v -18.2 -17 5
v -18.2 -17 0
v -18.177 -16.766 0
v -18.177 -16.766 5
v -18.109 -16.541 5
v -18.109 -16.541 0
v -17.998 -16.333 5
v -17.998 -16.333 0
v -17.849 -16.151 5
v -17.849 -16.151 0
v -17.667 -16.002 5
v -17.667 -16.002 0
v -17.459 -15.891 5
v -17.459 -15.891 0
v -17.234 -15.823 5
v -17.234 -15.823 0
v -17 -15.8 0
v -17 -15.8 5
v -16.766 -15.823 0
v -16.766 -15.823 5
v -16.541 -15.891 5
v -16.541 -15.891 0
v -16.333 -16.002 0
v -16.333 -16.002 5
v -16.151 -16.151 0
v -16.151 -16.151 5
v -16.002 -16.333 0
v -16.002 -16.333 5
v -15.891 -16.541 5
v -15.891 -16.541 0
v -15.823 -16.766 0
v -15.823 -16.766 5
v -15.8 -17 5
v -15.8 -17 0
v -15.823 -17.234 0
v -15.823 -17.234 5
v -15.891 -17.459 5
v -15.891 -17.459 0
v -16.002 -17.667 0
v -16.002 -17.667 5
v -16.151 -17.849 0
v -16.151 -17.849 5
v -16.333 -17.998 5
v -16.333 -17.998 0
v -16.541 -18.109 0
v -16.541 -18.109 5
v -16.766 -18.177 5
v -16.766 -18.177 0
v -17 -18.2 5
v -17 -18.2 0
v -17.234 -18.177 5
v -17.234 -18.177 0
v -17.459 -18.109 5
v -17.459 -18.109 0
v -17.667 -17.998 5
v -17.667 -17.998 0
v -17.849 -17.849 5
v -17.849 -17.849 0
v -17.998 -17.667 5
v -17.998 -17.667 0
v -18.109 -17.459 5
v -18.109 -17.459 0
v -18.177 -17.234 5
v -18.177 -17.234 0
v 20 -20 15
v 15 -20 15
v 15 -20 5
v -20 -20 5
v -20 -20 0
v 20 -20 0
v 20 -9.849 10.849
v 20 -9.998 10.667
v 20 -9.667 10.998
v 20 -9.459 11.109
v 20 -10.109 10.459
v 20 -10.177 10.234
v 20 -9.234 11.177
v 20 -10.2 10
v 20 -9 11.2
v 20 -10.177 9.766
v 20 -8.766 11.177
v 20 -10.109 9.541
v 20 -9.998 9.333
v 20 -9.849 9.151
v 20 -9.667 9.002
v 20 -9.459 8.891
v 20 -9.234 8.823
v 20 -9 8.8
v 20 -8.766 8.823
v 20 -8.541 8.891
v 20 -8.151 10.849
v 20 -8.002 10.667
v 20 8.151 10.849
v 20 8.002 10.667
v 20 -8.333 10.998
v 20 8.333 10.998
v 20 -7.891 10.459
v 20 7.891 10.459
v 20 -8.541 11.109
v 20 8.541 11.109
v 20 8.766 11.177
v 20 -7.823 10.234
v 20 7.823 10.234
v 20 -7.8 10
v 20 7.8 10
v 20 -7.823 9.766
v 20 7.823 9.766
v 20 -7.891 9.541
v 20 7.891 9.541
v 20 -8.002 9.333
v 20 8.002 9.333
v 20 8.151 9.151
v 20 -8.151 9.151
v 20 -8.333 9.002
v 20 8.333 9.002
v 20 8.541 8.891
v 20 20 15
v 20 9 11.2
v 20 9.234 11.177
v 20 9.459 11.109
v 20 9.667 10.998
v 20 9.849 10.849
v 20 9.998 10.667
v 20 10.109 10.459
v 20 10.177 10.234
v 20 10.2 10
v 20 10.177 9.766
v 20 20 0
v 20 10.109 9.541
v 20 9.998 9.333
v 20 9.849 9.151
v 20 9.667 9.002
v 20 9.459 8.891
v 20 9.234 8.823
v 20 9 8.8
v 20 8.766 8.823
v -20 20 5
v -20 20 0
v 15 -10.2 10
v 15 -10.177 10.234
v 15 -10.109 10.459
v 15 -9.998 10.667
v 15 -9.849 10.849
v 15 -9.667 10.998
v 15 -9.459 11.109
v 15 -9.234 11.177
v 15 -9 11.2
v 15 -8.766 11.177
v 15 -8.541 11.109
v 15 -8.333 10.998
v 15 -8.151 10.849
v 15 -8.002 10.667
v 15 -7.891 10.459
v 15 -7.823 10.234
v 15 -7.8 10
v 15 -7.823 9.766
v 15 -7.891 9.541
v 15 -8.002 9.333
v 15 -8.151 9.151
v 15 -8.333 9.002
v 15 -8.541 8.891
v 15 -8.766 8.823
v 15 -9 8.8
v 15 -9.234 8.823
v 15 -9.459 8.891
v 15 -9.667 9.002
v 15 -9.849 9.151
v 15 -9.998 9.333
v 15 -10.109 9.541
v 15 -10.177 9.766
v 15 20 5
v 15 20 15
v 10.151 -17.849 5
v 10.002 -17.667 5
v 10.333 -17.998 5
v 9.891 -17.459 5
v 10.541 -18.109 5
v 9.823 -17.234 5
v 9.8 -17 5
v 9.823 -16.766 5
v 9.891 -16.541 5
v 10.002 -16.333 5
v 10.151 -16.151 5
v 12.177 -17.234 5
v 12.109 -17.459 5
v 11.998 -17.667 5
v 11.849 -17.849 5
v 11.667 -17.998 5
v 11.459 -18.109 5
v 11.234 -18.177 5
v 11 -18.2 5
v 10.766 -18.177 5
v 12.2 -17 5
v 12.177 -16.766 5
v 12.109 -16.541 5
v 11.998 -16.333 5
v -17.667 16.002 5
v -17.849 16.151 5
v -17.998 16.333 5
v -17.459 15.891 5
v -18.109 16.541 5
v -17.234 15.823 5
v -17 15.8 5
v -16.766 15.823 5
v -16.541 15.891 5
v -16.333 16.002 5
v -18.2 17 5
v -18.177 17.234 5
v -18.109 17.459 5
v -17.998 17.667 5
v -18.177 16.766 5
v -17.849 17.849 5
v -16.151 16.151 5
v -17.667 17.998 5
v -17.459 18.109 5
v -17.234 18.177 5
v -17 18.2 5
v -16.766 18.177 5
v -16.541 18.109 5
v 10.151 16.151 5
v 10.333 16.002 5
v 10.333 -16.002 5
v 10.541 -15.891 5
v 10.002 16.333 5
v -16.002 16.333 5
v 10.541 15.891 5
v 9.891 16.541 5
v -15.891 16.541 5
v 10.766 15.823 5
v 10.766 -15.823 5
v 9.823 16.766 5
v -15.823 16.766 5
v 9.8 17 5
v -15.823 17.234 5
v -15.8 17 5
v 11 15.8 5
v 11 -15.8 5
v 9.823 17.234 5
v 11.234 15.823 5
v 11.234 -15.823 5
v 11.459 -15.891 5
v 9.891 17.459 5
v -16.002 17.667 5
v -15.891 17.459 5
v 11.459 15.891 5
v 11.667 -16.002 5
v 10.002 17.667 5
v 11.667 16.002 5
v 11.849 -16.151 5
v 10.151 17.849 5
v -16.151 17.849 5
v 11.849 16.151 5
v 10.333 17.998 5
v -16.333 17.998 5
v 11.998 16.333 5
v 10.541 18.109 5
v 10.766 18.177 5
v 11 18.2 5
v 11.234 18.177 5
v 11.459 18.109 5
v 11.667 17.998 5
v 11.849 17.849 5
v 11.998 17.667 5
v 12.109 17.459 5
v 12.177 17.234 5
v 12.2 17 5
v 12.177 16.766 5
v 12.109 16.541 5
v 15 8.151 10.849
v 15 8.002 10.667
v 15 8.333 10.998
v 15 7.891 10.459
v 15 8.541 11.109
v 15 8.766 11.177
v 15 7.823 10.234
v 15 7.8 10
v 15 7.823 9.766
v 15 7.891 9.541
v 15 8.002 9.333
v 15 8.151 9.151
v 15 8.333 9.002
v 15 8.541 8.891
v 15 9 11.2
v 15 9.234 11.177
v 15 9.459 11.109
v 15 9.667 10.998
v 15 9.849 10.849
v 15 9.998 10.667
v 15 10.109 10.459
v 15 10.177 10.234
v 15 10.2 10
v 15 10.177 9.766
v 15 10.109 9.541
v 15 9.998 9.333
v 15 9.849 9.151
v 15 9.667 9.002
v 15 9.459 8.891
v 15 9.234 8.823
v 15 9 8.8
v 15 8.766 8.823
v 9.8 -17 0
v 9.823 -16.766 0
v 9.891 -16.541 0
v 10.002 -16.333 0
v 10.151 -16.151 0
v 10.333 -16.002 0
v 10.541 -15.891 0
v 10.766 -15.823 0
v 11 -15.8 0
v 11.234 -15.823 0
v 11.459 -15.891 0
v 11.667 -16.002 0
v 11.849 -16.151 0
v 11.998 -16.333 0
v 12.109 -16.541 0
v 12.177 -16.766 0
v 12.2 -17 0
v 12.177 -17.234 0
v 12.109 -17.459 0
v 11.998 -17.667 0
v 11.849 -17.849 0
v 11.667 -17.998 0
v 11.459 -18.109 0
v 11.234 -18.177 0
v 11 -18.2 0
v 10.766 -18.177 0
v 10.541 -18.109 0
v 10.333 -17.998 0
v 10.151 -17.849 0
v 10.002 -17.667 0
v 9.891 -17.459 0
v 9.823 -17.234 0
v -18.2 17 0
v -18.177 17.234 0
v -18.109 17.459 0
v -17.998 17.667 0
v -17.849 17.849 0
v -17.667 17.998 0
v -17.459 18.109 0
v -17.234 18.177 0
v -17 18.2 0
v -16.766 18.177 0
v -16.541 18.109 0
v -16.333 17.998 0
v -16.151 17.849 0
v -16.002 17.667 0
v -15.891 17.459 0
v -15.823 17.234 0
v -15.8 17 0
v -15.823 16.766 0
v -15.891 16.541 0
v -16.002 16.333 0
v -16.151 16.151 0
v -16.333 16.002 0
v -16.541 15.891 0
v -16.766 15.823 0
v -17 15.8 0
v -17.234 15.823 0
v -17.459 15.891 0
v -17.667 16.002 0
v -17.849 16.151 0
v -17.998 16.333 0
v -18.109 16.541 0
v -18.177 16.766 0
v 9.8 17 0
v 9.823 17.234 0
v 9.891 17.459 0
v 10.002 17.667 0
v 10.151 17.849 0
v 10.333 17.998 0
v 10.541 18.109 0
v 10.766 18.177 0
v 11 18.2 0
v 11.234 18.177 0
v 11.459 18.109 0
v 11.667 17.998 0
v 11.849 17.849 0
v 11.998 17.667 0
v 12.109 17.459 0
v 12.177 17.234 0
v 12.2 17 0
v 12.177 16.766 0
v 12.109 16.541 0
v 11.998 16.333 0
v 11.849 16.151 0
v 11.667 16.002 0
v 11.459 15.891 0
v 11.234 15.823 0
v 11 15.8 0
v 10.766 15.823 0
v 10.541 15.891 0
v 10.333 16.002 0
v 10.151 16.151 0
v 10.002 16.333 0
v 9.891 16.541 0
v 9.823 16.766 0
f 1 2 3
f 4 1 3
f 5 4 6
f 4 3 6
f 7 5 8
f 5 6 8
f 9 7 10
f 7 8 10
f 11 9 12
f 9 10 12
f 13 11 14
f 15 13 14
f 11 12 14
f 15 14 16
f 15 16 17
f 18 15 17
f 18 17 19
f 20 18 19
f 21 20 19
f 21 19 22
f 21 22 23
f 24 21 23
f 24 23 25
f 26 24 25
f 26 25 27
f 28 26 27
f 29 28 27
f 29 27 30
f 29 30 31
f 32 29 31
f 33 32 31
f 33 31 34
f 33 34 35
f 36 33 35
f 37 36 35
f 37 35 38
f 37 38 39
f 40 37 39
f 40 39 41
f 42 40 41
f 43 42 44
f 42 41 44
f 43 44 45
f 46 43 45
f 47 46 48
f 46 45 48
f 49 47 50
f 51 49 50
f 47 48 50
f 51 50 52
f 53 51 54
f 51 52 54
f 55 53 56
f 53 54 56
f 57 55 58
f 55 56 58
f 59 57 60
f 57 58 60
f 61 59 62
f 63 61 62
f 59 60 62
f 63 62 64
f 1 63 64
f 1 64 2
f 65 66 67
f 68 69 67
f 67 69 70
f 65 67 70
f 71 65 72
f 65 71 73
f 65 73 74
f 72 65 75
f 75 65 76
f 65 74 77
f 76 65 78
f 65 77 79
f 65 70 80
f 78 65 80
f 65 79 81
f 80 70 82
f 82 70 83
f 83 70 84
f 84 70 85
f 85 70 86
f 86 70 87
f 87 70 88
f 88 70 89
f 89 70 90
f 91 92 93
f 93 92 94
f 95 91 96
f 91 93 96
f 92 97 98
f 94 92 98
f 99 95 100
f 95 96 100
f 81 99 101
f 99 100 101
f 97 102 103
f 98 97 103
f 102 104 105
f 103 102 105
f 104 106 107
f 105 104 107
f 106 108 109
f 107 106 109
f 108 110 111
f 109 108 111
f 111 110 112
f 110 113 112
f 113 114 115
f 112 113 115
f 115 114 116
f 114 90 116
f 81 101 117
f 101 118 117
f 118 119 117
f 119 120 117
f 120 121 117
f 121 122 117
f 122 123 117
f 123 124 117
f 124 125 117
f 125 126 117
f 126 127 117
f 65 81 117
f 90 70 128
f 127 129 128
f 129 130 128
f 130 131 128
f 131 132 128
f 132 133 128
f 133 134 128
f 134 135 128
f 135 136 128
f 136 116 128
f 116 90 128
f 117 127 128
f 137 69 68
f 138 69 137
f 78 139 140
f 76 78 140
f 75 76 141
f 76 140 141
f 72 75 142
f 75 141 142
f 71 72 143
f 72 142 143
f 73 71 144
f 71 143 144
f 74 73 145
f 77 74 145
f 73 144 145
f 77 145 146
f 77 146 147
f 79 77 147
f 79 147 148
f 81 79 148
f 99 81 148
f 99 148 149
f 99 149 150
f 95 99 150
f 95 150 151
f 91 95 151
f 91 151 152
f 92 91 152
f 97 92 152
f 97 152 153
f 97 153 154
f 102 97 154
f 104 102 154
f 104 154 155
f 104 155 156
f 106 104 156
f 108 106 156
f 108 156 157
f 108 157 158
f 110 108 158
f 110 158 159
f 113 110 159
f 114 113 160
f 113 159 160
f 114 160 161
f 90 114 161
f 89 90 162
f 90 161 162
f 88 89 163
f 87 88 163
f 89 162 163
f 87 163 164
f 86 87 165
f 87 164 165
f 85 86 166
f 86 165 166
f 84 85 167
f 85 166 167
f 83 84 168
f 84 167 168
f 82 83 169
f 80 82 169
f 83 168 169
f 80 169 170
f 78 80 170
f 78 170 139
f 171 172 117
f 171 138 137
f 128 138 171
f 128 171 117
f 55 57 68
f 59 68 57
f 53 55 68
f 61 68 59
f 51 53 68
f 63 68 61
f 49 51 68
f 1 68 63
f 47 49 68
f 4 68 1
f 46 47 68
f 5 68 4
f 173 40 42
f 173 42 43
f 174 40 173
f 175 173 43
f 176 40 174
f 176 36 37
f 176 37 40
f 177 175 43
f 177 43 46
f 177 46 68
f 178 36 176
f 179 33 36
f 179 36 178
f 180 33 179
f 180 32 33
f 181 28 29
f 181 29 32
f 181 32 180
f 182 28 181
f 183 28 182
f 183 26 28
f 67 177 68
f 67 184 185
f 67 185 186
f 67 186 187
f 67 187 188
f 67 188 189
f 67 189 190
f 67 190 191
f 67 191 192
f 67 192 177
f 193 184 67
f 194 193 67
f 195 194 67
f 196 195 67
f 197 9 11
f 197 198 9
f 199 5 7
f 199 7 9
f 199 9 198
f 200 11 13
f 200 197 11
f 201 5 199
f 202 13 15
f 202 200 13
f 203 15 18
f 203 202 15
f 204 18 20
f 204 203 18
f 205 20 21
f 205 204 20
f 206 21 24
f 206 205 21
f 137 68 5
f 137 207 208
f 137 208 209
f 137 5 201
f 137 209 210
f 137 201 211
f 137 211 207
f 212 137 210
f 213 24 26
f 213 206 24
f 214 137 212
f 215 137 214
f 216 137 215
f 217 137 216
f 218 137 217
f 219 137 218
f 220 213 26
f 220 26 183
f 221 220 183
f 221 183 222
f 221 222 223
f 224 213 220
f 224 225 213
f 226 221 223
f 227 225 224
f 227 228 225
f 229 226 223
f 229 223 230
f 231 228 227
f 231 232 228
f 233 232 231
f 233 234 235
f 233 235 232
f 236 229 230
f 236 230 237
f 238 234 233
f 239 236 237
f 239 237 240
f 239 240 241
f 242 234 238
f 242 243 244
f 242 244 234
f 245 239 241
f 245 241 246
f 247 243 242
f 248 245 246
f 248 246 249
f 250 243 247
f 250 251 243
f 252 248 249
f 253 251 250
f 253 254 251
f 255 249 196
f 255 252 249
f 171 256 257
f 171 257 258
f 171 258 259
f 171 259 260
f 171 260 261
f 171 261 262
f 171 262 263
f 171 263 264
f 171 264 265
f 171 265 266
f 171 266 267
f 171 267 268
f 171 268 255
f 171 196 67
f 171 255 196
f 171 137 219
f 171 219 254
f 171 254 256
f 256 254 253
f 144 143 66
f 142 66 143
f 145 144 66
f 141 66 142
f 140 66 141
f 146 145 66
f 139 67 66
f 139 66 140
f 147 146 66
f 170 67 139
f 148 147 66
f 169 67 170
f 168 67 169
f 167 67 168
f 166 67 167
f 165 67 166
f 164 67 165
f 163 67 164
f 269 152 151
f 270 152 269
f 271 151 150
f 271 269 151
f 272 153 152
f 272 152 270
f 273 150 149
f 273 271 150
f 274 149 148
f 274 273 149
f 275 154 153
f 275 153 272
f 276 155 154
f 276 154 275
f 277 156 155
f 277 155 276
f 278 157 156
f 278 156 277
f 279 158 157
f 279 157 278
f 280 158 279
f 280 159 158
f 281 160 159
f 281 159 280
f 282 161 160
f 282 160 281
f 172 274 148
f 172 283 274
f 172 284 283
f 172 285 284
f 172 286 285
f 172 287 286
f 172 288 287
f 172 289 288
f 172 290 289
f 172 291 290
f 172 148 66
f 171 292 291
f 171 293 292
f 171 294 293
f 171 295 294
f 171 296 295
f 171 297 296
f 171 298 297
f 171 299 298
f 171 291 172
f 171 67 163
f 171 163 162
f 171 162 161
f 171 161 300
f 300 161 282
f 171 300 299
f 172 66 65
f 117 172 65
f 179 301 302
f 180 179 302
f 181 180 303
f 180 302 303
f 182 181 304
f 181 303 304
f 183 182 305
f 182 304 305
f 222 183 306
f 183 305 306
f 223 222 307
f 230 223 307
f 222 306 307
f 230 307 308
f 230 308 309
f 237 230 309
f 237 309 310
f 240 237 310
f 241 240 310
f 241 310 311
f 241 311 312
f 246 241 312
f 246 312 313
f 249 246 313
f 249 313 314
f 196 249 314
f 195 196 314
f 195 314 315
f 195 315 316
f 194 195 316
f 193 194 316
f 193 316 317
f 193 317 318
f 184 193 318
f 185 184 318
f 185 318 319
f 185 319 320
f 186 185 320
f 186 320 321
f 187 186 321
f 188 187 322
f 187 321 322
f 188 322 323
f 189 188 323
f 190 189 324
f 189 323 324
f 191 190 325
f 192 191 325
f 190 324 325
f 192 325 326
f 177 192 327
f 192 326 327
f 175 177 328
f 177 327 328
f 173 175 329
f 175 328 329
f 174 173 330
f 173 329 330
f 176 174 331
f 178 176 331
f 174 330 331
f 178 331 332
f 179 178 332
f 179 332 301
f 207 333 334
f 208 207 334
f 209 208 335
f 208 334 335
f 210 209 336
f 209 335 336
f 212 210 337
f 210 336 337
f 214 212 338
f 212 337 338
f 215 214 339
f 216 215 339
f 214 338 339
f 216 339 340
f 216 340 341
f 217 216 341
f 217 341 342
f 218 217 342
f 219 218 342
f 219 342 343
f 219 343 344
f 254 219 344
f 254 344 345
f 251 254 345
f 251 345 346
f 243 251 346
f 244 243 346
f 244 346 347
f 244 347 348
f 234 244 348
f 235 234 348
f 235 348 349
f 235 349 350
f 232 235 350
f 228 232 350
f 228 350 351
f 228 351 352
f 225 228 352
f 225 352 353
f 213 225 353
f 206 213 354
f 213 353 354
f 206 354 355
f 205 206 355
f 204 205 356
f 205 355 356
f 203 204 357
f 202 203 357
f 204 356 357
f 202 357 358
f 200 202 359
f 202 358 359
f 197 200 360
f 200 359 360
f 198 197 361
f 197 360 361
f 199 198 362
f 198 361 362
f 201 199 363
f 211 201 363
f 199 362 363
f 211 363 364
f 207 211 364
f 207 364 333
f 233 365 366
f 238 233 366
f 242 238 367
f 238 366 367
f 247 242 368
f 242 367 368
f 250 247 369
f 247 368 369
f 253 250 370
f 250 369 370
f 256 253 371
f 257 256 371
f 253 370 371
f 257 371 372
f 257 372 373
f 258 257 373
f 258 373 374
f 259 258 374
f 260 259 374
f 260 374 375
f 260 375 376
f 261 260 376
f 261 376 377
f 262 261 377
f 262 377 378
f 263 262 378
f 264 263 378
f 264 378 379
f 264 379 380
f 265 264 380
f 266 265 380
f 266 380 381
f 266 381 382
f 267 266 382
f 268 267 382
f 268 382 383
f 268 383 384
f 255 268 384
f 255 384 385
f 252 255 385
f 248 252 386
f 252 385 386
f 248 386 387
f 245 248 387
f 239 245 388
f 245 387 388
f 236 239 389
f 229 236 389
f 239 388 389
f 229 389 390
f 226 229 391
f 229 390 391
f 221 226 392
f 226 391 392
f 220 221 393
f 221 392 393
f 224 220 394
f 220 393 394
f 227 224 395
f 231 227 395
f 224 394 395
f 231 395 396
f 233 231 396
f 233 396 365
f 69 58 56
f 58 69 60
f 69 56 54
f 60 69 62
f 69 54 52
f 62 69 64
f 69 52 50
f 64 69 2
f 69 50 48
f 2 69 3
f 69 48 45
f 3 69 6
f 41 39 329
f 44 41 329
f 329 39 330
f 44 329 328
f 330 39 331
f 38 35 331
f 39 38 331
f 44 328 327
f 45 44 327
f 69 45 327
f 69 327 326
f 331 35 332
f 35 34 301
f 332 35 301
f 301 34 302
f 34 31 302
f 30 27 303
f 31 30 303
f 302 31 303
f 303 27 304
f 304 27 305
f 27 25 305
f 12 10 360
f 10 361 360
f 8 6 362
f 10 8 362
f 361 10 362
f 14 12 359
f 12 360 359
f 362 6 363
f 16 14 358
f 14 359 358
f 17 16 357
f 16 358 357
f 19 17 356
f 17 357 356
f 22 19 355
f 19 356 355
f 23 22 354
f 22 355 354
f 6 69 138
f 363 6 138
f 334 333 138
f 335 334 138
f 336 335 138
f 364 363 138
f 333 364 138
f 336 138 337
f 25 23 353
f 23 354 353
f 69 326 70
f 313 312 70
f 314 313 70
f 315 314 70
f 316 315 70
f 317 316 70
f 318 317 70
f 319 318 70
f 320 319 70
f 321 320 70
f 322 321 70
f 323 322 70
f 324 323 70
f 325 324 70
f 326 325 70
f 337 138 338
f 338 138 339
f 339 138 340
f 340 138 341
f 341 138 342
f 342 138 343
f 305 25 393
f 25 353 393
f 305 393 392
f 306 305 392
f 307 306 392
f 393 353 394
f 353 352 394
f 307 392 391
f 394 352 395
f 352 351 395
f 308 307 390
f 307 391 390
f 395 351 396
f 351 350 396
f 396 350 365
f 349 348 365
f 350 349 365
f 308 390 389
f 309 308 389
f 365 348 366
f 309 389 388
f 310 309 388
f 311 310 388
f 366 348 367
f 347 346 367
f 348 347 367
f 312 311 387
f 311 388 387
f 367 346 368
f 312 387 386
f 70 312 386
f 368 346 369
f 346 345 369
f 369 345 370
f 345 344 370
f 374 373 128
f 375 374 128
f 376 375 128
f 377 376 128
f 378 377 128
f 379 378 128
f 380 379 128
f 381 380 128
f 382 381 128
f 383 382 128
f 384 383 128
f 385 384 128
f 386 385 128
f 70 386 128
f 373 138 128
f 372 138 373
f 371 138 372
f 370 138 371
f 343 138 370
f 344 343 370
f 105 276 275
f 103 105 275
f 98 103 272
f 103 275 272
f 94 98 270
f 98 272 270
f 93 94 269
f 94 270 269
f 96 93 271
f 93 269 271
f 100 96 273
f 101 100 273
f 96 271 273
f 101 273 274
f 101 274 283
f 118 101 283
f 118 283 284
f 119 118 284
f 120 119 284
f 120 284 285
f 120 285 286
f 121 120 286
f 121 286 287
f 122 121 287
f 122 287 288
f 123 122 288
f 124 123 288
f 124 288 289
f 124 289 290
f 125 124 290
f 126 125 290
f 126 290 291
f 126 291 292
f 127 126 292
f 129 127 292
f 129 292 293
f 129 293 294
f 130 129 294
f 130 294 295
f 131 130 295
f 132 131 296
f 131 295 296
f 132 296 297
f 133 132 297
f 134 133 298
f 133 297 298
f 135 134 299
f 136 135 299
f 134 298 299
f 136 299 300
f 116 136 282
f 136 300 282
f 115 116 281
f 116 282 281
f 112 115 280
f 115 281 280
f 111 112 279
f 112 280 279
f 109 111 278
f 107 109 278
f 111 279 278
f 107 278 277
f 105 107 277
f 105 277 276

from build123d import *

# Parameters (mm, degrees)
F0_W     = 40
F0_H     = 40
F1_DEPTH = 5
F2_W     = 5
F2_H     = 40
F3_DEPTH = 10
F5_D     = 2.4
F7_D     = 2.4


with BuildPart() as f1:
    # F0 (on Top) → F1 (new body)
    with BuildSketch(Plane.XY):
        Rectangle(F0_W, F0_H)
    extrude(amount=F1_DEPTH)

    # F2 (on face) → F3 (join)
    with BuildSketch(Plane.XY.offset(5)):
        with Locations((17.5, 0)):
            Rectangle(F2_W, F2_H)
    extrude(amount=F3_DEPTH)

    # F5 (through all)
    with Locations(Plane.YZ.offset(20)):
        with Locations((-9, 10), (9, 10)):
            Hole(F5_D / 2)

    # F7 (through all)
    with Locations(Plane.XY.offset(5)):
        with Locations((-17, 17), (11, 17), (11, -17), (-17, -17)):
            Hole(F7_D / 2)


solid = f1.part
